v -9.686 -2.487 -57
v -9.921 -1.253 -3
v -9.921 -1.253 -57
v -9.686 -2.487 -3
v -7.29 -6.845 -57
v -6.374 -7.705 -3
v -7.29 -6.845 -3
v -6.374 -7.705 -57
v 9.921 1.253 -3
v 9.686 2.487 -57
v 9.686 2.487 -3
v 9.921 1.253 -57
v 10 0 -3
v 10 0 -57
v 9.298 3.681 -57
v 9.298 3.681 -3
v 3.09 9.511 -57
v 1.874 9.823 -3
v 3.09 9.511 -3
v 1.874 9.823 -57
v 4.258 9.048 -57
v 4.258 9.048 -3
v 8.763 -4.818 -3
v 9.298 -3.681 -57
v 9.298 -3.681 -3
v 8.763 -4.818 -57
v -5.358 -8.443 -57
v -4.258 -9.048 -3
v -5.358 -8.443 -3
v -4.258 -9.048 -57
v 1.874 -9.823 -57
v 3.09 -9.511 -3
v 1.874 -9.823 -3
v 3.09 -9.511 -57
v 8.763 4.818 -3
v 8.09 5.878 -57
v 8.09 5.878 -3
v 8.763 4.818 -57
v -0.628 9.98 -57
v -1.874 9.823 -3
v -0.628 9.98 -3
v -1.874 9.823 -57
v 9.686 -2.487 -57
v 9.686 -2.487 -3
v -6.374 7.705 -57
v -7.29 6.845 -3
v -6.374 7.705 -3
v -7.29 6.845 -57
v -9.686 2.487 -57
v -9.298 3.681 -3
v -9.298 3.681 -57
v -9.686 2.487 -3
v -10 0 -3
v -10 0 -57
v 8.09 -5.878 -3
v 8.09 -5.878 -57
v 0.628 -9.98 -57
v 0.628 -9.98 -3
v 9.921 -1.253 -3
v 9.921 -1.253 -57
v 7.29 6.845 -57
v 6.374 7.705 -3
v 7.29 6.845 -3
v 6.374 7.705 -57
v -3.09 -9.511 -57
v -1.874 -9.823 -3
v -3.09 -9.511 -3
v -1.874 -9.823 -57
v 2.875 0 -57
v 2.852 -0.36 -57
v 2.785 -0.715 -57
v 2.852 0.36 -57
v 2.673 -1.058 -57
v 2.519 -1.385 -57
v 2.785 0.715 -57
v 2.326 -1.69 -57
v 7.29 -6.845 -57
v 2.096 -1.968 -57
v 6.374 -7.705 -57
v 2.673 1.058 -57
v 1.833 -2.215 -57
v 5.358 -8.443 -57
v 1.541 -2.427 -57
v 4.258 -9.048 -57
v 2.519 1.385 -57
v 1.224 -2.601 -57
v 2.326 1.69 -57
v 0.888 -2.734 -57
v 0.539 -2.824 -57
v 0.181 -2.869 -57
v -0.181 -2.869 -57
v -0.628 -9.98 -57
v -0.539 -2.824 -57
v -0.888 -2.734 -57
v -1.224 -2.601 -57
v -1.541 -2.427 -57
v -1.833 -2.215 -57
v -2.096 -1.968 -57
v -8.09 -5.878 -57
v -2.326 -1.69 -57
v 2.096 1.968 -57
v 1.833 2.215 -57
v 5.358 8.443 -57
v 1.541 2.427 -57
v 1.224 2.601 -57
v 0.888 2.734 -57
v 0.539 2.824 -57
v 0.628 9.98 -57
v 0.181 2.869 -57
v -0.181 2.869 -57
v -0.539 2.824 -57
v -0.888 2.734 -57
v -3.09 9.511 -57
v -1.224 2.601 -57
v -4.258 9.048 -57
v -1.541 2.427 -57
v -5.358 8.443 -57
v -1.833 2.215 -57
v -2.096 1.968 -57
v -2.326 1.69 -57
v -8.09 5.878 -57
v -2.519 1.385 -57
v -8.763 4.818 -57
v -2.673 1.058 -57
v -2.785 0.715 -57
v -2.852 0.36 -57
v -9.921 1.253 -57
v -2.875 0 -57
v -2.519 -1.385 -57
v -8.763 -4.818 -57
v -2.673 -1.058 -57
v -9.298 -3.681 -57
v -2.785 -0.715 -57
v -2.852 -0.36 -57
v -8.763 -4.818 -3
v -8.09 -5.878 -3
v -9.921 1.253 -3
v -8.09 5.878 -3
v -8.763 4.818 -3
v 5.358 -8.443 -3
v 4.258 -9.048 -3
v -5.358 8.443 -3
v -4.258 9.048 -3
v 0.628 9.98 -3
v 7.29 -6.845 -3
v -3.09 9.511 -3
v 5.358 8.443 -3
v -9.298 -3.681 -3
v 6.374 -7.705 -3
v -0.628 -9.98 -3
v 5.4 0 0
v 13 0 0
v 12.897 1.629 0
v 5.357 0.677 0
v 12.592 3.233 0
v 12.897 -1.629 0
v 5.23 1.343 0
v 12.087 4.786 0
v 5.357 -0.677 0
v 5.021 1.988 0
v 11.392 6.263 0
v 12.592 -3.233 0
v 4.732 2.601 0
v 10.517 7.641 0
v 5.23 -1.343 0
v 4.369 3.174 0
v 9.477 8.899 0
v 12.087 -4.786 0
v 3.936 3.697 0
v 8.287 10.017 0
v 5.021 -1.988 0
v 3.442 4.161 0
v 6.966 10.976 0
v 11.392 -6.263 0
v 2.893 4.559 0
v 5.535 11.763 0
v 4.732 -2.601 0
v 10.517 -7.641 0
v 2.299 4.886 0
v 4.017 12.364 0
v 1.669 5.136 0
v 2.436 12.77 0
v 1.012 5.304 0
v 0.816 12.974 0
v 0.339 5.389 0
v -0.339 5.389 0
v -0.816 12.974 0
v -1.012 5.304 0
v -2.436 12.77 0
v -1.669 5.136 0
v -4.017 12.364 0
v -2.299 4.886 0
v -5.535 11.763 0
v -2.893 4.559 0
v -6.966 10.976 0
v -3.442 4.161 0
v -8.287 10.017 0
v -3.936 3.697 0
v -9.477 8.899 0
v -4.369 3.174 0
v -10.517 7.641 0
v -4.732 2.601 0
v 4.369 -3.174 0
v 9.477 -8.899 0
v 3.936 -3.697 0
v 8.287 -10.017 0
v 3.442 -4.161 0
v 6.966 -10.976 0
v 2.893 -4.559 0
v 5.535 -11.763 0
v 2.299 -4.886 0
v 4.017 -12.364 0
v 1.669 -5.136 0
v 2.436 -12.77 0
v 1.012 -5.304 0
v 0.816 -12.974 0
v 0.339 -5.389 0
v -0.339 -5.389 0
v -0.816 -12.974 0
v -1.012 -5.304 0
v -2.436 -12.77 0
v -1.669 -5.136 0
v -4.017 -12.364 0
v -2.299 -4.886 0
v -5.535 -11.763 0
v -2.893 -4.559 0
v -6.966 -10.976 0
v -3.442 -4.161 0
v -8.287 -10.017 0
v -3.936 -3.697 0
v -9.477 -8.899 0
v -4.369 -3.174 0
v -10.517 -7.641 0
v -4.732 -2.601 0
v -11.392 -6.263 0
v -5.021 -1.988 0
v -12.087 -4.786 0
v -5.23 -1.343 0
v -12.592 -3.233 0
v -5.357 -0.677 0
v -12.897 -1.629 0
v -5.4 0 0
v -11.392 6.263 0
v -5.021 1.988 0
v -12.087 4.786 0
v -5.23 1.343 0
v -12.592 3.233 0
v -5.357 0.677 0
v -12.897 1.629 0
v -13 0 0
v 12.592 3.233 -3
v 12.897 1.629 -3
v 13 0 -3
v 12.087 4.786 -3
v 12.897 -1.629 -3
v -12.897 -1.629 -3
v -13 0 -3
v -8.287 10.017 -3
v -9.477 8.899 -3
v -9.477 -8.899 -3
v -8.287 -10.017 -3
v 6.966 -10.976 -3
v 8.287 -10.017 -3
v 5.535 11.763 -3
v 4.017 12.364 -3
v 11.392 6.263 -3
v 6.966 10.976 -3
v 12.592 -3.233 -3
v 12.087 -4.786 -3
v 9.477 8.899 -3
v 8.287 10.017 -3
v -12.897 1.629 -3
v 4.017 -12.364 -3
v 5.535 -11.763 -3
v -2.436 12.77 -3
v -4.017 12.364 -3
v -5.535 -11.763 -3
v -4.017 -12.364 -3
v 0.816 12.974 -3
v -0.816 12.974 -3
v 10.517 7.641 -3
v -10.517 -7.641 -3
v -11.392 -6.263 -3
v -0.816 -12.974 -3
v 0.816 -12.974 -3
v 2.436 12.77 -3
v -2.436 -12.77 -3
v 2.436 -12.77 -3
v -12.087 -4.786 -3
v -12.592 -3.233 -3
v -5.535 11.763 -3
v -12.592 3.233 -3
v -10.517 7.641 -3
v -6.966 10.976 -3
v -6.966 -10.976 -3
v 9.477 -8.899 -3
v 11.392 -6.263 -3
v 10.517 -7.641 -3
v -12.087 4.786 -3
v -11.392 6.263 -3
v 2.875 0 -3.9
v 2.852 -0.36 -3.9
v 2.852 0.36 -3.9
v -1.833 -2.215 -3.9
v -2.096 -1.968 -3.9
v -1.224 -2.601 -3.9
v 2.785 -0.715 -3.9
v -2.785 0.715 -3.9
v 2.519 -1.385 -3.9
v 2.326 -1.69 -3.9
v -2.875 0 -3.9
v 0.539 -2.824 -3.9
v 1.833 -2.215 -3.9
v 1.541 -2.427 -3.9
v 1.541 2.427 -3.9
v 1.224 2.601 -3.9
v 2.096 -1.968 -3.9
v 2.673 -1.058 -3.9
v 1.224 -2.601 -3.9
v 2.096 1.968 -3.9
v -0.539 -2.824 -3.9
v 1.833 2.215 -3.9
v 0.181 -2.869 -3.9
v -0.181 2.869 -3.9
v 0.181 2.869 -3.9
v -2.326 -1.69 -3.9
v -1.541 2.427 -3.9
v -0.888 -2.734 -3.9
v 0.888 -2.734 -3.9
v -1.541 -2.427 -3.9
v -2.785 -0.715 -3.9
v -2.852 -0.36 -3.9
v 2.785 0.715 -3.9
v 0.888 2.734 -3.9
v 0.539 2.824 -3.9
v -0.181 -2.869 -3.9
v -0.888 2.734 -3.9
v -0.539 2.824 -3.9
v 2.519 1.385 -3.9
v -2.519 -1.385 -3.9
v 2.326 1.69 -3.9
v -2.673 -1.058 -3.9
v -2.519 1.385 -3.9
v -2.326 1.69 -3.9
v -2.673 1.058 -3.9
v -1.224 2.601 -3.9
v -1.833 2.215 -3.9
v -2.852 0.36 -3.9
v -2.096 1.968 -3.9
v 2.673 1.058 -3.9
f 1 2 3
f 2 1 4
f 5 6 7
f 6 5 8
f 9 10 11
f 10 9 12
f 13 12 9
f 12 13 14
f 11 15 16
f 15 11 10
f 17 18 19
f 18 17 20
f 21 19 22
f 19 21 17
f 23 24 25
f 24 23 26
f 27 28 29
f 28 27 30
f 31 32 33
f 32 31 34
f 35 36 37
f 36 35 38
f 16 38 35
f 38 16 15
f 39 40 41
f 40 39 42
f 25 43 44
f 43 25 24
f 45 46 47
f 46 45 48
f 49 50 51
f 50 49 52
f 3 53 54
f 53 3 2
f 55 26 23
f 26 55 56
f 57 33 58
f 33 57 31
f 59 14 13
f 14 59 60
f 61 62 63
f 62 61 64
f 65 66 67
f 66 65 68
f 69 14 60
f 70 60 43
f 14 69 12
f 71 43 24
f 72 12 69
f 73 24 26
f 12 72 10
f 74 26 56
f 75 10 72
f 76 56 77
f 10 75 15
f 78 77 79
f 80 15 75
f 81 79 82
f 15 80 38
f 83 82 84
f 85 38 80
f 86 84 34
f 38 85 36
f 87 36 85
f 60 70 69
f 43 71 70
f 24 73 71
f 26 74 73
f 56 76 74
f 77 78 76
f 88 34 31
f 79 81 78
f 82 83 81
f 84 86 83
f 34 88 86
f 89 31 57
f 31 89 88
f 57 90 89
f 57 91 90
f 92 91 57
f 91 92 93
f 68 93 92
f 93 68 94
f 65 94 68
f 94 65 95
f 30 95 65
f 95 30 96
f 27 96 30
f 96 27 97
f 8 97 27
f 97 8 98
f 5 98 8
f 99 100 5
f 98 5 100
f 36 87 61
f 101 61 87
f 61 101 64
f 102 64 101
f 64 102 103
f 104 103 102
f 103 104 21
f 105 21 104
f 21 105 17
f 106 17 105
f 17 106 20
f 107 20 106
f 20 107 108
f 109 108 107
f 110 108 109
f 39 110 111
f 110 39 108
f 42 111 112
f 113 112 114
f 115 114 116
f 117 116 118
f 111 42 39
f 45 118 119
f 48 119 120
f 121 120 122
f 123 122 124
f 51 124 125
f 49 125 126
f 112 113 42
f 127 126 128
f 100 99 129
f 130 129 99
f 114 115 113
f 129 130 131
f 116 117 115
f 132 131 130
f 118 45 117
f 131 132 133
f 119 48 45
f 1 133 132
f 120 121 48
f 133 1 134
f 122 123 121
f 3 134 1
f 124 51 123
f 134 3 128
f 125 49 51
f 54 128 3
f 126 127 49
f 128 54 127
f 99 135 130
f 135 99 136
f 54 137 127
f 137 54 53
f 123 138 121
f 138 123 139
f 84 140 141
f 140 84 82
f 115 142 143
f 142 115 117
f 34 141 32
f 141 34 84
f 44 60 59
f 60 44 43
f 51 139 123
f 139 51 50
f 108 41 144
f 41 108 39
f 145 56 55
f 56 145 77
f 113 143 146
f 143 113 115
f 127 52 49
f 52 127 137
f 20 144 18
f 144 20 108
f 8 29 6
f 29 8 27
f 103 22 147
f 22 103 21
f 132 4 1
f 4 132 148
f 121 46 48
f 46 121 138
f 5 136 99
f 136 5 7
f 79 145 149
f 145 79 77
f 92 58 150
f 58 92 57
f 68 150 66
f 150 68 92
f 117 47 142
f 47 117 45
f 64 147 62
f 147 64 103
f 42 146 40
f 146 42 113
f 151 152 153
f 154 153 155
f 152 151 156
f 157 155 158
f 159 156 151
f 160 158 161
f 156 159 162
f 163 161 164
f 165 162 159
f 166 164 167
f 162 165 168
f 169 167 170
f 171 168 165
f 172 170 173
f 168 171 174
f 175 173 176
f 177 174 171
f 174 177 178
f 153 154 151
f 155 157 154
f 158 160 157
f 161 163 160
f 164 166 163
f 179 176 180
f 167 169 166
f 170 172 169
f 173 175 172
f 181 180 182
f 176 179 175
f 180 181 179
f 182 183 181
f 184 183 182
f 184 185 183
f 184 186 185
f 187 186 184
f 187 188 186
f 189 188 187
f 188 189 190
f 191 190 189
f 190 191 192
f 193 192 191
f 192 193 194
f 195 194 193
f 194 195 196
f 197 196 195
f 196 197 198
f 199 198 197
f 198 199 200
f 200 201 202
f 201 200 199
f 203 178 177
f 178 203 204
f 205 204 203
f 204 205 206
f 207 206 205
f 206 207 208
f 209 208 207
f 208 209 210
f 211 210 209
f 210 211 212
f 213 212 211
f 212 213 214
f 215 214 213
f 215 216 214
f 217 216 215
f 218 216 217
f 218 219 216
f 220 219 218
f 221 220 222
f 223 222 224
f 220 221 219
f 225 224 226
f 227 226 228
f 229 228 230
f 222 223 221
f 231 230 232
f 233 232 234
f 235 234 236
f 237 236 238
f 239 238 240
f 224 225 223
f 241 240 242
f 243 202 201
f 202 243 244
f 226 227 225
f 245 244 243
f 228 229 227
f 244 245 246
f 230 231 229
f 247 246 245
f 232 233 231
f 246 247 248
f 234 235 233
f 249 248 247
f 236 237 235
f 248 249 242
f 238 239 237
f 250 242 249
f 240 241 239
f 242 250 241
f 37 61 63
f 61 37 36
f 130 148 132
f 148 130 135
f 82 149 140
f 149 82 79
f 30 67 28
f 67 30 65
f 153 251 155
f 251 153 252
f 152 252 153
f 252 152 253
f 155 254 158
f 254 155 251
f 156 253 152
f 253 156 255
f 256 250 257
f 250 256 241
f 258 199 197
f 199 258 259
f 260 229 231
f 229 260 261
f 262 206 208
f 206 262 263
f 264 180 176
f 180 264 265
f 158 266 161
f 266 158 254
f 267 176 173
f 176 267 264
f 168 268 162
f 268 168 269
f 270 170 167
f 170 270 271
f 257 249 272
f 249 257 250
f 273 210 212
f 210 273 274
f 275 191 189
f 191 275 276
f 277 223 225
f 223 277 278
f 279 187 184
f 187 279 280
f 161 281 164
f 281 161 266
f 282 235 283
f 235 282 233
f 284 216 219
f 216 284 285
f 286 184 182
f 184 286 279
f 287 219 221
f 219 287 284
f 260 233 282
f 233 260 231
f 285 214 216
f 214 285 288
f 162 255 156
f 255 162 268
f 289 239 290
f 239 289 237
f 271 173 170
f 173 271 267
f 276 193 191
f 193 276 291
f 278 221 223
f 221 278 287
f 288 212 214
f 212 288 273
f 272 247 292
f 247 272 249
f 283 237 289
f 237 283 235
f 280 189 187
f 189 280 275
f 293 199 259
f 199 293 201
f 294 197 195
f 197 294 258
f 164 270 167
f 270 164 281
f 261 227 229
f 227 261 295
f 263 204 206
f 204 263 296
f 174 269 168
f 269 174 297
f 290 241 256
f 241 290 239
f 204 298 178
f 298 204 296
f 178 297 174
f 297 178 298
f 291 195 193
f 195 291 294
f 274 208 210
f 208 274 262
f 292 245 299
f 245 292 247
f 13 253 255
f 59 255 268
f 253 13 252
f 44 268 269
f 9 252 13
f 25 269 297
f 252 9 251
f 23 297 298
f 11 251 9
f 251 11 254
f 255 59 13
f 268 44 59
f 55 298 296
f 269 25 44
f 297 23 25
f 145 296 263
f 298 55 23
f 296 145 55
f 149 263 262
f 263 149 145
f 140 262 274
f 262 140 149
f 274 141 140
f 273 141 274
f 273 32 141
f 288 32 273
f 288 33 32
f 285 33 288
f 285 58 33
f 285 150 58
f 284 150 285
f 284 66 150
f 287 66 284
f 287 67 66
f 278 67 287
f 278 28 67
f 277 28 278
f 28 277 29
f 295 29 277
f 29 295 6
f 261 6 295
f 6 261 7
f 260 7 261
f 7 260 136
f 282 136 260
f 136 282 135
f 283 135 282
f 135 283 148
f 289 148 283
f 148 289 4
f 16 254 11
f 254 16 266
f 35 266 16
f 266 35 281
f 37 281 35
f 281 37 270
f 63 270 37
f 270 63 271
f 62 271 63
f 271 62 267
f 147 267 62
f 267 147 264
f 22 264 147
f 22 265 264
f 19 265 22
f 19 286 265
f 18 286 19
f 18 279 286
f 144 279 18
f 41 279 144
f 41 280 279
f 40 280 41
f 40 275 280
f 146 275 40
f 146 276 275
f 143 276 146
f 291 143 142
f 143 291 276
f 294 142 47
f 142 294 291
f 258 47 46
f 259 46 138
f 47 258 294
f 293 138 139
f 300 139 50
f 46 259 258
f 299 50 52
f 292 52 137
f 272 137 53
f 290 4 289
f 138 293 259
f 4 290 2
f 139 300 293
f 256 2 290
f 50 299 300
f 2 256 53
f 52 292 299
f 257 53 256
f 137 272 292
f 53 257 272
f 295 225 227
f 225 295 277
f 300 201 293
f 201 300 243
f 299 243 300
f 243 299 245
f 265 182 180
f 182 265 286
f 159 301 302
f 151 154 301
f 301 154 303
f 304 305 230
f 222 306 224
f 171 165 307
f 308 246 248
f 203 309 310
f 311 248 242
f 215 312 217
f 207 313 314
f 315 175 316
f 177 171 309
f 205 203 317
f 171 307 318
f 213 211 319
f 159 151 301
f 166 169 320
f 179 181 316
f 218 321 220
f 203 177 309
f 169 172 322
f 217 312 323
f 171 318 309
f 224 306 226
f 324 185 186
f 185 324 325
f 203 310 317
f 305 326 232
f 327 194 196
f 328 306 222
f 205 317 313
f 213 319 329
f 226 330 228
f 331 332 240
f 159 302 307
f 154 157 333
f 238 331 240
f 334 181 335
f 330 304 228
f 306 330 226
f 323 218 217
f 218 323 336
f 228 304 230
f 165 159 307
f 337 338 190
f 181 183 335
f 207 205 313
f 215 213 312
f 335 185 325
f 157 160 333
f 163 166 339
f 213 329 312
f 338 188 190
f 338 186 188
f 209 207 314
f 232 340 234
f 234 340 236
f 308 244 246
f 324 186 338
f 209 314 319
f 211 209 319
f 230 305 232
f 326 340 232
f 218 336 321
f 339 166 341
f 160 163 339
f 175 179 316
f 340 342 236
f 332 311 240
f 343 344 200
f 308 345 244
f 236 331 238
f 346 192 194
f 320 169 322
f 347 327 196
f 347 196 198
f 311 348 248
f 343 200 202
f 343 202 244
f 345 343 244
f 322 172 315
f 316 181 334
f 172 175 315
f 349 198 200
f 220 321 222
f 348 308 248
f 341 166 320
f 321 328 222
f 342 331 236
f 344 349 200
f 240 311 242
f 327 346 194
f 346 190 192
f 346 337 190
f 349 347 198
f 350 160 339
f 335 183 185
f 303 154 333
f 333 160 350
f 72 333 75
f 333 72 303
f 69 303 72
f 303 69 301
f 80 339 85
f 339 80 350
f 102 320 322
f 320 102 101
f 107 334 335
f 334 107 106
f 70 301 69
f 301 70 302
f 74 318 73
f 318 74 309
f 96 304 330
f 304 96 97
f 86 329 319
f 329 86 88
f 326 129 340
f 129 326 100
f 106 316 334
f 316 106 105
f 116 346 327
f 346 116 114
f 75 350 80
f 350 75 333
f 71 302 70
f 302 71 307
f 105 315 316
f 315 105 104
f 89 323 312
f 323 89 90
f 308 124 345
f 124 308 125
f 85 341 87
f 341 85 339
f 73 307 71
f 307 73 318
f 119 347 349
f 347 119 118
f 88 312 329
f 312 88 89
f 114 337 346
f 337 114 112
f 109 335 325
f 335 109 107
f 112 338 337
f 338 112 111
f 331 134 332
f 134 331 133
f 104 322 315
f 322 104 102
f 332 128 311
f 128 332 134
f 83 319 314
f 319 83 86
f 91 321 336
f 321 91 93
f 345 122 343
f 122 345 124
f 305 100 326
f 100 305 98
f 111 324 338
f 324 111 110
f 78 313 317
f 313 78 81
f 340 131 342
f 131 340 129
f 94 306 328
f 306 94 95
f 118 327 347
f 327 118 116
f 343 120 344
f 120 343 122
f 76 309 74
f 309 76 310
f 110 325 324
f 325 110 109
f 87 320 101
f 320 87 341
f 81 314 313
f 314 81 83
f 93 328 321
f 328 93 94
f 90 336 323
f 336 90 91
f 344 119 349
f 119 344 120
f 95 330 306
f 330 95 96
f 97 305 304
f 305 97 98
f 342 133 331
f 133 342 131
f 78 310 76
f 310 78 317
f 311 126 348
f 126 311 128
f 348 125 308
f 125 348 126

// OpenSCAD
$fn = 50;


difference() {
	union() {
		translate(v = [0, 0, -57.0000000000]) {
			cylinder(h = 57, r = 10.0000000000);
		}
		translate(v = [0, 0, -3.0000000000]) {
			cylinder(h = 3, r = 13.0000000000);
		}
	}
	union() {
		translate(v = [0, 0, 0]) {
			rotate(a = [0, 0, 0]) {
				difference() {
					union() {
						#translate(v = [0, 0, -57.0000000000]) {
							cylinder(h = 57, r = 2.6000000000);
						}
						#translate(v = [0, 0, -3.9000000000]) {
							cylinder(h = 3.9000000000, r1 = 2.8750000000, r2 = 5.4000000000);
						}
						#translate(v = [0, 0, -57.0000000000]) {
							cylinder(h = 57, r = 2.8750000000);
						}
						#translate(v = [0, 0, -57.0000000000]) {
							cylinder(h = 57, r = 2.6000000000);
						}
					}
					union();
				}
			}
		}
	}
}
